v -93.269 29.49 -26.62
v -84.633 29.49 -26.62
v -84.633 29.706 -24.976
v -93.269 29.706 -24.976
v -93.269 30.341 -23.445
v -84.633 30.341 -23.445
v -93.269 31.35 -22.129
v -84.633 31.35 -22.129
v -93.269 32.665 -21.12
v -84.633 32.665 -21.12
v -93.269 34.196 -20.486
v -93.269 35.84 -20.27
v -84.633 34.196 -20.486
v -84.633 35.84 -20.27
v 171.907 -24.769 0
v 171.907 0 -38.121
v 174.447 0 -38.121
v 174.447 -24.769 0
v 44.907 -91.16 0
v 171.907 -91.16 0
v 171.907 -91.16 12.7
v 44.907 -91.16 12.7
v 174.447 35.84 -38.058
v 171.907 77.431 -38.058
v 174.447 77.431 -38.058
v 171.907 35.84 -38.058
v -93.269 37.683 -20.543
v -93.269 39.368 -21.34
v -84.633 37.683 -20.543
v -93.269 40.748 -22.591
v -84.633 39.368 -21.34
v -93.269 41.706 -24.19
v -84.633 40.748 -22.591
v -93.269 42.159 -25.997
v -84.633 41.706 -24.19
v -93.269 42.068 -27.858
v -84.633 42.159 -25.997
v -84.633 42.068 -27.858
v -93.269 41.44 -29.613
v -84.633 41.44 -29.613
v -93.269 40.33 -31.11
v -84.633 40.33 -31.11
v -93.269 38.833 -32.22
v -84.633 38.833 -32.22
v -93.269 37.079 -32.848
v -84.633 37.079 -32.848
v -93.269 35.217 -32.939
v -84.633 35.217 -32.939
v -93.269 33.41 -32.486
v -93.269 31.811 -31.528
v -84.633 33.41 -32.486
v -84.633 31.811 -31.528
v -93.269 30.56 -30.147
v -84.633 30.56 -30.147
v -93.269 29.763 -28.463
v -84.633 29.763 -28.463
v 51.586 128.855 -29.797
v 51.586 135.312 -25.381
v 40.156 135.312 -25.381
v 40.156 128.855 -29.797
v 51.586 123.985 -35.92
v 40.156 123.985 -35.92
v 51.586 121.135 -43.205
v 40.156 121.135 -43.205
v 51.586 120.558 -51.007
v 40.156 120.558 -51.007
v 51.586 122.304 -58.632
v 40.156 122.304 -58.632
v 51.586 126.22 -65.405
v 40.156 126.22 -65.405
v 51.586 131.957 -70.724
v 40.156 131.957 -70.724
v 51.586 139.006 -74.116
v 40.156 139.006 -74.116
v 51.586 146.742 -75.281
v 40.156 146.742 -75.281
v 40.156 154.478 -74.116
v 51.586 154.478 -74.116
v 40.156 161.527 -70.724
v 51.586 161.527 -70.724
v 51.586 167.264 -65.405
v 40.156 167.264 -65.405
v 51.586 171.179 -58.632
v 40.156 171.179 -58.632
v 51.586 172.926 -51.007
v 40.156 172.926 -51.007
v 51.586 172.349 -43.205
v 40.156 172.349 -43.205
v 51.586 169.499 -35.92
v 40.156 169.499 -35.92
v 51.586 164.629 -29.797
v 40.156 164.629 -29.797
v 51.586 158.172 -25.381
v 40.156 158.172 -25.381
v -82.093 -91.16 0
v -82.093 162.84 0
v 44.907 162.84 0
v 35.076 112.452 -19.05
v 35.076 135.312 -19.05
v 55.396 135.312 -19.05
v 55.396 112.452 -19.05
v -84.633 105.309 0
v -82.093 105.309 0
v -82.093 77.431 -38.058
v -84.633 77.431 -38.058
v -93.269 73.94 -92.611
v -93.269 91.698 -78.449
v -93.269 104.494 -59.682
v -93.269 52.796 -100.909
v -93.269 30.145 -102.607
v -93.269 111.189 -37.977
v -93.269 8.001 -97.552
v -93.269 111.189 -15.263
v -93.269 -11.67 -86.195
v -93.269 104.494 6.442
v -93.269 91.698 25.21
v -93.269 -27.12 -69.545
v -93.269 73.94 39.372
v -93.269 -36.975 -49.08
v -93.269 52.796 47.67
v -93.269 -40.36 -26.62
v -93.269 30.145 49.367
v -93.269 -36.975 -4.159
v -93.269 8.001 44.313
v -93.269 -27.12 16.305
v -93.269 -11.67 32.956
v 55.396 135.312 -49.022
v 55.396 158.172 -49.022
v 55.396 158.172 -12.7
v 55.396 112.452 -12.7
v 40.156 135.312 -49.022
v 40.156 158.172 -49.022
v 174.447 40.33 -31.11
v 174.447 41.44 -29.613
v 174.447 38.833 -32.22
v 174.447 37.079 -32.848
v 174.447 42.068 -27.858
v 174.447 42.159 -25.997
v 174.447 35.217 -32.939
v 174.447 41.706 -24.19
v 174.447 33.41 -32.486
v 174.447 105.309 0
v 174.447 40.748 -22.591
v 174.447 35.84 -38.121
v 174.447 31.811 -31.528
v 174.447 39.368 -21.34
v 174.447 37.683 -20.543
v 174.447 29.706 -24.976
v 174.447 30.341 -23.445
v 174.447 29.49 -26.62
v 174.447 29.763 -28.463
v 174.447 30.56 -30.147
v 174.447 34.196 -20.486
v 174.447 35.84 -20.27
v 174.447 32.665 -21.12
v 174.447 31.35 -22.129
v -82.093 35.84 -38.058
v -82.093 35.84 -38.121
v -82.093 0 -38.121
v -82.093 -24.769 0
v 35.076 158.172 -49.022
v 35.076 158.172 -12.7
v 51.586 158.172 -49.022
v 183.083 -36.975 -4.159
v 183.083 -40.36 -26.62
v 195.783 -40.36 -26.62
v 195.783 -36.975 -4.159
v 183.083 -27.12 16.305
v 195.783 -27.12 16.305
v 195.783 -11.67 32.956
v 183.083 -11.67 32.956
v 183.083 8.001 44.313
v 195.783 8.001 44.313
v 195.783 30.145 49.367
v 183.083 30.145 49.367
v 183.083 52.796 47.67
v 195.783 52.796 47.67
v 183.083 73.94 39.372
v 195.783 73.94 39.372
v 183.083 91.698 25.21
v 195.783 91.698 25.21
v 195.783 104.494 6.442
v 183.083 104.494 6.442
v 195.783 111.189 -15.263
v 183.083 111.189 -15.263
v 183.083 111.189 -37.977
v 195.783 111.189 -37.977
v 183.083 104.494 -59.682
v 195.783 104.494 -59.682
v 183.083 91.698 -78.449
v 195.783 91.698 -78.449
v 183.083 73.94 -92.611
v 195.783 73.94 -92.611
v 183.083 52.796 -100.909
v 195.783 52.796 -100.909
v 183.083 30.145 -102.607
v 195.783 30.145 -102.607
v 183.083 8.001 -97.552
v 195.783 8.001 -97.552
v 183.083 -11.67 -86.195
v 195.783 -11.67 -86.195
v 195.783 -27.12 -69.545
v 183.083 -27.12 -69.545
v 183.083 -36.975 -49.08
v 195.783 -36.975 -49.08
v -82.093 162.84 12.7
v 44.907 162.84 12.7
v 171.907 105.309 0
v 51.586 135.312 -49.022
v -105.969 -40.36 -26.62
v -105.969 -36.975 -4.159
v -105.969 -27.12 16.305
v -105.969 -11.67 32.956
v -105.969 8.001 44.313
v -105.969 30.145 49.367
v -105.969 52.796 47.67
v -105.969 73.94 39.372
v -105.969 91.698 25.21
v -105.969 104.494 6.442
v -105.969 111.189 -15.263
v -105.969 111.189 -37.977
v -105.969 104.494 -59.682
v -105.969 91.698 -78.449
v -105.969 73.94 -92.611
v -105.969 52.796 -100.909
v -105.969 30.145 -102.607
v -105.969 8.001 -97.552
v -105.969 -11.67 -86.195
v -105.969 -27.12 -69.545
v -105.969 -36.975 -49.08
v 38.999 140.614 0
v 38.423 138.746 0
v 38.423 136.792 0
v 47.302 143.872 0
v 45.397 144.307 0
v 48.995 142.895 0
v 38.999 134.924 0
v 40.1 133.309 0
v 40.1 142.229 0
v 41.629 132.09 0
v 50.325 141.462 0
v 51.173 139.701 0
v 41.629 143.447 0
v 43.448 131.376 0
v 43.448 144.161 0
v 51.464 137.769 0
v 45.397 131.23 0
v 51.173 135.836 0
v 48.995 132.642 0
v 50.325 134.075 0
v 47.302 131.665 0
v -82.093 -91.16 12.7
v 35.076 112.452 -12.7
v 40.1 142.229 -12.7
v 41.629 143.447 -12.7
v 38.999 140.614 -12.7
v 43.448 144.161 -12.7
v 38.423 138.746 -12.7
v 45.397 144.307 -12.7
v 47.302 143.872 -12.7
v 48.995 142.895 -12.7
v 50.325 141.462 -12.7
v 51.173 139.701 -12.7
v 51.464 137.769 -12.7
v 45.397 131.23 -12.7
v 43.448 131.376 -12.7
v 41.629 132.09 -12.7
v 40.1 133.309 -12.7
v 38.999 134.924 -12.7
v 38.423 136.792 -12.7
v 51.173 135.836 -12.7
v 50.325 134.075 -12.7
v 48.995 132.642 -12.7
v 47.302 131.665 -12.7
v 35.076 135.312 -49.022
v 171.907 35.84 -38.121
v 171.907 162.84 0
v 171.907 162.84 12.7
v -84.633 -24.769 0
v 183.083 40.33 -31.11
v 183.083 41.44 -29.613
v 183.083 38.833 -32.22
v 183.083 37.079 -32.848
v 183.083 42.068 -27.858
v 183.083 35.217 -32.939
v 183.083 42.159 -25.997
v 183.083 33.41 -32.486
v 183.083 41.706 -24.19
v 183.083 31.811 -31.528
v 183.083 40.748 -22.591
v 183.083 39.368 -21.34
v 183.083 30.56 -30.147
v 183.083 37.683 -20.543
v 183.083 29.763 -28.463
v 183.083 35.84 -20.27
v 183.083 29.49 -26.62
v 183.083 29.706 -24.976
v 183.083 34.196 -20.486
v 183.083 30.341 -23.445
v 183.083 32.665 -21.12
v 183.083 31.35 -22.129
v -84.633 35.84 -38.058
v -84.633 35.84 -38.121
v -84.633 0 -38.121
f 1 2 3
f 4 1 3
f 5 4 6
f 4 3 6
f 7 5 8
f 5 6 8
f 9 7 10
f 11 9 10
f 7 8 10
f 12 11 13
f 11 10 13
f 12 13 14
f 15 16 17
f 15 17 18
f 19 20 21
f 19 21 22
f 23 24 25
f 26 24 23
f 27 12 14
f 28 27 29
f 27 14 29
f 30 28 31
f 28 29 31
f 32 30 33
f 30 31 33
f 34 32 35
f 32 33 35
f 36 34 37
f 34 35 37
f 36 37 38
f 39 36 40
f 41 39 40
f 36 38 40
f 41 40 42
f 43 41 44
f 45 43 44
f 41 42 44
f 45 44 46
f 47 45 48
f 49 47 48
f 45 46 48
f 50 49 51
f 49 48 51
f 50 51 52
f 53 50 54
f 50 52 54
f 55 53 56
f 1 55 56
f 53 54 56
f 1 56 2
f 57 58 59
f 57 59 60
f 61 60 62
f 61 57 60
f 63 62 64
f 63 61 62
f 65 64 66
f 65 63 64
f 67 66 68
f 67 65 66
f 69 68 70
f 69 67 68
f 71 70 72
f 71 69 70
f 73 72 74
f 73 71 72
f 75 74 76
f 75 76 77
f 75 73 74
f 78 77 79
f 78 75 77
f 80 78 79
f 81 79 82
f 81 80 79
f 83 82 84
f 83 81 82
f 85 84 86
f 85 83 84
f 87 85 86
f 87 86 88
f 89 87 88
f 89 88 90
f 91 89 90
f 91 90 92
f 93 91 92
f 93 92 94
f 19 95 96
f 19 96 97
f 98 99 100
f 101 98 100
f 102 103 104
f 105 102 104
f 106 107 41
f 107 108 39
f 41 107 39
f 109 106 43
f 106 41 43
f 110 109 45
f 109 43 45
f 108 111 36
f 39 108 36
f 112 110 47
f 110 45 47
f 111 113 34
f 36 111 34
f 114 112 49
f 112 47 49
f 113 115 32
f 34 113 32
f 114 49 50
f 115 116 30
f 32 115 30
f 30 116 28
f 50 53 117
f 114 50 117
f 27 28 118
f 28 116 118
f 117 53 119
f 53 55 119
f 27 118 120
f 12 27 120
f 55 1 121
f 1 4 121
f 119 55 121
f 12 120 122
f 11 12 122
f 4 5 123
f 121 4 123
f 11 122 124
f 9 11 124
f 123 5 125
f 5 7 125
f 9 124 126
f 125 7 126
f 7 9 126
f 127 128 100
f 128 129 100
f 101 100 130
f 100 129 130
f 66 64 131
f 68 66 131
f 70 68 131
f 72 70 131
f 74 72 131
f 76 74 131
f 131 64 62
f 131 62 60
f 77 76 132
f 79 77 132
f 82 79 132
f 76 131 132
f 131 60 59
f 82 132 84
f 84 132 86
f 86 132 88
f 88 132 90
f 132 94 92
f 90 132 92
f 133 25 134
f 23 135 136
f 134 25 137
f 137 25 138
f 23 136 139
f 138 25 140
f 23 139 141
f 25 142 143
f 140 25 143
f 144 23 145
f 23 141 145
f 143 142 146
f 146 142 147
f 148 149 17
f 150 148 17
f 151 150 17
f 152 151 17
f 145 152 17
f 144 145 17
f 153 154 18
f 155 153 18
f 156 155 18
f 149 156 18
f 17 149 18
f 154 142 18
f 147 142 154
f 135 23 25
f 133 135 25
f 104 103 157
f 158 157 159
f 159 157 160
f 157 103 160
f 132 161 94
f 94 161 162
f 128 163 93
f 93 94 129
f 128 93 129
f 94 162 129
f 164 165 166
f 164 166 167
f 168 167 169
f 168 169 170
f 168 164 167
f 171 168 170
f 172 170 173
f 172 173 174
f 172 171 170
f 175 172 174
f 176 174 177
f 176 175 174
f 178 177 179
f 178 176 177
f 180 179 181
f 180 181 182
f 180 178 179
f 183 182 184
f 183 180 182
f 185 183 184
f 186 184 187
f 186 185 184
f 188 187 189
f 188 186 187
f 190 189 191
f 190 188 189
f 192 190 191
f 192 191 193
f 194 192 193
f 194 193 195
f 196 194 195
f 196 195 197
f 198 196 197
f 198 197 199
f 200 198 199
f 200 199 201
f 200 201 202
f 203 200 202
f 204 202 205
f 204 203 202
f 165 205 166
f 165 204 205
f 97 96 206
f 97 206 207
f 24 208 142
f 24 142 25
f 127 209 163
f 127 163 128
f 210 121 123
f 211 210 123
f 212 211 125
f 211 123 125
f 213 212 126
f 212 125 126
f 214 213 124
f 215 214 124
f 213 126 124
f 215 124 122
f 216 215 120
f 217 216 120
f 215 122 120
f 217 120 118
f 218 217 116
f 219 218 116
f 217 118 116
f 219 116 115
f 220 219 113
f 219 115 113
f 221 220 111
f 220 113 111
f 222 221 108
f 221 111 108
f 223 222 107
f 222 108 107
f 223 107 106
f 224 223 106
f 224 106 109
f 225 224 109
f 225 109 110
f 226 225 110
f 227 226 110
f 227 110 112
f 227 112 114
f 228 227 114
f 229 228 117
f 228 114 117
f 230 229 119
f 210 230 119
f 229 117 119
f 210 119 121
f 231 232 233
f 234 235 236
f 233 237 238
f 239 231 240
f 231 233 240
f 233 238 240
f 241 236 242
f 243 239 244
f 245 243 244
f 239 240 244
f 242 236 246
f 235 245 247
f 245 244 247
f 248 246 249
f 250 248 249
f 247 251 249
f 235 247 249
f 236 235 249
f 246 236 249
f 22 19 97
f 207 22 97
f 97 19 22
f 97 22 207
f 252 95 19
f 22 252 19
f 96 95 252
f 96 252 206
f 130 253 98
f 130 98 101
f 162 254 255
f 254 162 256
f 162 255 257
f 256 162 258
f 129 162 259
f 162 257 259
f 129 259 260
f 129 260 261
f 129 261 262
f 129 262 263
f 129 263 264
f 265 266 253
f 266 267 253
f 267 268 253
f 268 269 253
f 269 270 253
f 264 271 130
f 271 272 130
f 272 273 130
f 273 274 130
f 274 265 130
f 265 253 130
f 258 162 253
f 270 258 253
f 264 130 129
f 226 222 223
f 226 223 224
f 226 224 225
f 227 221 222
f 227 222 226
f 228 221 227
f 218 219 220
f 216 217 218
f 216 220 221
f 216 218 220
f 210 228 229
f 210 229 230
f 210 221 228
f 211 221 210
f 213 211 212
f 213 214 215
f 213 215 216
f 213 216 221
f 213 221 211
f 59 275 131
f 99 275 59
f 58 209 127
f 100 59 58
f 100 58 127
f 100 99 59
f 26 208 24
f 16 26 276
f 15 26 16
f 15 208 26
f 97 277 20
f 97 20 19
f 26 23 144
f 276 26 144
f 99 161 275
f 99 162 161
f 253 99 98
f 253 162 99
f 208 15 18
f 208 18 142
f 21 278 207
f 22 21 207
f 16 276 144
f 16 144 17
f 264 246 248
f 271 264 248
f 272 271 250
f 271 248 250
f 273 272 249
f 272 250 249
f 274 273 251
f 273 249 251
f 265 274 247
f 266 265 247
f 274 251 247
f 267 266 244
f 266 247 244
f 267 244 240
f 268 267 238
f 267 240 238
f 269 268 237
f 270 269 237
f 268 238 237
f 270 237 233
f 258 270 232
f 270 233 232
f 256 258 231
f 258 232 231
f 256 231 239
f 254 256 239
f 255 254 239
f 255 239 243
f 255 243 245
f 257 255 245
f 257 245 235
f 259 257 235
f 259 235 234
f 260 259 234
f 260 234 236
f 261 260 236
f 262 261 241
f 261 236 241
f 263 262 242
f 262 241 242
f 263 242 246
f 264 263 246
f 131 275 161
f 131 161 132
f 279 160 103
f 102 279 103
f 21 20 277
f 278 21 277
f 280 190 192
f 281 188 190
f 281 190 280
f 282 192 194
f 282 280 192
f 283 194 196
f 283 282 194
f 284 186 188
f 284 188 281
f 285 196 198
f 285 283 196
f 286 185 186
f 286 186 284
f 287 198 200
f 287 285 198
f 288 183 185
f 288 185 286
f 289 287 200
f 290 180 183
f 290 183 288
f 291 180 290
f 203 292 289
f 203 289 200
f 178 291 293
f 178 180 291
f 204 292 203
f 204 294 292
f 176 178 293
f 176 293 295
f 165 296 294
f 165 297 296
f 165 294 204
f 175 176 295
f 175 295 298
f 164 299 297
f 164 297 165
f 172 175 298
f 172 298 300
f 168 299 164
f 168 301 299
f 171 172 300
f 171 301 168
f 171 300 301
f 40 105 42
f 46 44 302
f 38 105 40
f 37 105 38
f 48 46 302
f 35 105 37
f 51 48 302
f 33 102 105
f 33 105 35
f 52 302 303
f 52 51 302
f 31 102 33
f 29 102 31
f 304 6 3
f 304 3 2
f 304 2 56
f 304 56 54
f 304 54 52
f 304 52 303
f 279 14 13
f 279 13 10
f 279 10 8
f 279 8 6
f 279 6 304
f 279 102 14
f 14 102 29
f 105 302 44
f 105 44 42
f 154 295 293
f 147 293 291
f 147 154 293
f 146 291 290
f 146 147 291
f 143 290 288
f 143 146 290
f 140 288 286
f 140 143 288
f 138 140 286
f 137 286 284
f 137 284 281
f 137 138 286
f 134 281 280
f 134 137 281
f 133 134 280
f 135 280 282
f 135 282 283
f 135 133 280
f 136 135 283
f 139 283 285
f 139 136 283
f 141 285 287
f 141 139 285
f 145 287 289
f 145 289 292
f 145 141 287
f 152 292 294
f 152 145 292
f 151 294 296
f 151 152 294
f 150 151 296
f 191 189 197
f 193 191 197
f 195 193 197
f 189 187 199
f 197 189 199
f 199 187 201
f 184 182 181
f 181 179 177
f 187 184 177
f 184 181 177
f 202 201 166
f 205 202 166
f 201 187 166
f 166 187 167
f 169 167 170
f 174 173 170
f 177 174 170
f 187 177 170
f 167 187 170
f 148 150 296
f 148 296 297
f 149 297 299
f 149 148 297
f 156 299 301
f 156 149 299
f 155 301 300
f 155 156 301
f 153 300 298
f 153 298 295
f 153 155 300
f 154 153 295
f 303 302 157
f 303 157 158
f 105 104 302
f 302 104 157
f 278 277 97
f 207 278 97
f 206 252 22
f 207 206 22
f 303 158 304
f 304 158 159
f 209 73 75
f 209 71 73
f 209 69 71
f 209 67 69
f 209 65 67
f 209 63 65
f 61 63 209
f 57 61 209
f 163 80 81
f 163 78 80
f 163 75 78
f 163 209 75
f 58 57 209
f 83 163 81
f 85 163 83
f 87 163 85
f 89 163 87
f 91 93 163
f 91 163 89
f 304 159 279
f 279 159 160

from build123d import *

# Parameters (mm, degrees)
F0_W      = 127
F0_H      = 254
F1_DEPTH  = 12.7
F3_DEPTH  = 11.176
F4_R      = 76.2
F5_DEPTH  = 12.7
F7_DEPTH  = 2.54
F12_R     = 6.556935049
F13_DEPTH = 12.7
F14_W     = 20.32
F14_H     = 45.72
F15_DEPTH = 6.35
F16_W     = 20.32
F16_H     = 22.86
F17_DEPTH = 29.972
F19_START = -3.81
F18_R     = 26.2593452301
F19_DEPTH = 11.43


# Not quite as in the source:
# - a feature names something its author has since deleted; it is built from what else it names
# - the program builds the solid bodies; features that only make, move or delete a surface that nothing else refers to are left out


with BuildPart() as f1:
    # F0 (on Top) → F1 (new body)
    with BuildSketch(Plane.XY):
        with Locations((-18.5930197371, 35.8398522526)):
            Rectangle(F0_W, F0_H)
    extrude(amount=F1_DEPTH)


with BuildPart() as f3:
    # F2 (on face) → F3 (new body)
    with BuildSketch(Plane(origin=(-82.0930197371, 0, 0), x_dir=(0, -1, 0), z_dir=(-1, 0, 0))):
        with BuildLine():
            ThreePointArc((-35.8398522526, -20.2696001321), (-40.3299803131, -31.1097281926), (-29.4898522526, -26.6196001321))
            ThreePointArc((-29.4898522526, -26.6196001321), (-31.3497241921, -22.1294720716), (-35.8398522526, -20.2696001321))
        make_face()
    extrude(amount=F3_DEPTH)

    # F4 (on face) → F5 (join)
    with BuildSketch(Plane(origin=(-93.2690197371, 0, 0), x_dir=(0, -1, 0), z_dir=(-1, 0, 0))):
        with Locations((-35.8398522526, -26.6196001321)):
            Circle(F4_R)
    extrude(amount=F5_DEPTH)

    # F6 (on face) → F7 (join)
    with BuildSketch(Plane(origin=(-82.0930197371, 0, 0), x_dir=(0, -1, 0), z_dir=(-1, 0, 0))):
        Polygon((0, 0), (-35.8398522526, 0), (-35.8398522526, -38.0577035248), (-35.8398522526, -38.1214432418), (0, -38.1214432418), (24.76891689, 0), align=None)
        Polygon((-35.8398522526, -38.0577035248), (-35.8398522526, 0), (-77.4306133389, 0), (-105.3093969822, 0), (-77.4306133389, -38.0577035248), align=None)
    extrude(amount=F7_DEPTH)


with BuildPart() as f11_1:
    # F11: instance of F3
    add(f3.part.mirror(Plane.YZ.offset(44.9069802629)))


with BuildPart() as f11_2:
    # F11: instance of F1
    add(f1.part.mirror(Plane.YZ.offset(44.9069802629)))


with BuildPart() as f13:
    # F12 (on face) → F13 (new body)
    with BuildSketch(Plane(origin=(0, 0, 0), x_dir=(1, 0, 0), z_dir=(0, 0, -1))):
        with Locations((44.9069802629, -137.7687752247)):
            Circle(F12_R)
    extrude(amount=F13_DEPTH)

    # F14 (on face) → F15 (join)
    with BuildSketch(Plane(origin=(0, 0, -12.7), x_dir=(1, 0, 0), z_dir=(0, 0, -1))):
        with Locations((45.2361442149, -135.3118325615)):
            Rectangle(F14_W, F14_H)
    extrude(amount=F15_DEPTH)

    # F16 (on face) → F17 (join)
    with BuildSketch(Plane(origin=(0, 0, -19.05), x_dir=(1, 0, 0), z_dir=(0, 0, -1))):
        with Locations((45.2361442149, -146.7418325615)):
            Rectangle(F16_W, F16_H)
    extrude(amount=F17_DEPTH)

    # F18 (on face) → F19 (join)
    with BuildSketch(Plane.YZ.offset(55.3961442149).offset(F19_START)):
        with Locations((146.7418325615, -49.022)):
            Circle(F18_R)
    extrude(amount=-F19_DEPTH)


solid = Compound([f1.part, f3.part, f11_1.part, f11_2.part, f13.part])
